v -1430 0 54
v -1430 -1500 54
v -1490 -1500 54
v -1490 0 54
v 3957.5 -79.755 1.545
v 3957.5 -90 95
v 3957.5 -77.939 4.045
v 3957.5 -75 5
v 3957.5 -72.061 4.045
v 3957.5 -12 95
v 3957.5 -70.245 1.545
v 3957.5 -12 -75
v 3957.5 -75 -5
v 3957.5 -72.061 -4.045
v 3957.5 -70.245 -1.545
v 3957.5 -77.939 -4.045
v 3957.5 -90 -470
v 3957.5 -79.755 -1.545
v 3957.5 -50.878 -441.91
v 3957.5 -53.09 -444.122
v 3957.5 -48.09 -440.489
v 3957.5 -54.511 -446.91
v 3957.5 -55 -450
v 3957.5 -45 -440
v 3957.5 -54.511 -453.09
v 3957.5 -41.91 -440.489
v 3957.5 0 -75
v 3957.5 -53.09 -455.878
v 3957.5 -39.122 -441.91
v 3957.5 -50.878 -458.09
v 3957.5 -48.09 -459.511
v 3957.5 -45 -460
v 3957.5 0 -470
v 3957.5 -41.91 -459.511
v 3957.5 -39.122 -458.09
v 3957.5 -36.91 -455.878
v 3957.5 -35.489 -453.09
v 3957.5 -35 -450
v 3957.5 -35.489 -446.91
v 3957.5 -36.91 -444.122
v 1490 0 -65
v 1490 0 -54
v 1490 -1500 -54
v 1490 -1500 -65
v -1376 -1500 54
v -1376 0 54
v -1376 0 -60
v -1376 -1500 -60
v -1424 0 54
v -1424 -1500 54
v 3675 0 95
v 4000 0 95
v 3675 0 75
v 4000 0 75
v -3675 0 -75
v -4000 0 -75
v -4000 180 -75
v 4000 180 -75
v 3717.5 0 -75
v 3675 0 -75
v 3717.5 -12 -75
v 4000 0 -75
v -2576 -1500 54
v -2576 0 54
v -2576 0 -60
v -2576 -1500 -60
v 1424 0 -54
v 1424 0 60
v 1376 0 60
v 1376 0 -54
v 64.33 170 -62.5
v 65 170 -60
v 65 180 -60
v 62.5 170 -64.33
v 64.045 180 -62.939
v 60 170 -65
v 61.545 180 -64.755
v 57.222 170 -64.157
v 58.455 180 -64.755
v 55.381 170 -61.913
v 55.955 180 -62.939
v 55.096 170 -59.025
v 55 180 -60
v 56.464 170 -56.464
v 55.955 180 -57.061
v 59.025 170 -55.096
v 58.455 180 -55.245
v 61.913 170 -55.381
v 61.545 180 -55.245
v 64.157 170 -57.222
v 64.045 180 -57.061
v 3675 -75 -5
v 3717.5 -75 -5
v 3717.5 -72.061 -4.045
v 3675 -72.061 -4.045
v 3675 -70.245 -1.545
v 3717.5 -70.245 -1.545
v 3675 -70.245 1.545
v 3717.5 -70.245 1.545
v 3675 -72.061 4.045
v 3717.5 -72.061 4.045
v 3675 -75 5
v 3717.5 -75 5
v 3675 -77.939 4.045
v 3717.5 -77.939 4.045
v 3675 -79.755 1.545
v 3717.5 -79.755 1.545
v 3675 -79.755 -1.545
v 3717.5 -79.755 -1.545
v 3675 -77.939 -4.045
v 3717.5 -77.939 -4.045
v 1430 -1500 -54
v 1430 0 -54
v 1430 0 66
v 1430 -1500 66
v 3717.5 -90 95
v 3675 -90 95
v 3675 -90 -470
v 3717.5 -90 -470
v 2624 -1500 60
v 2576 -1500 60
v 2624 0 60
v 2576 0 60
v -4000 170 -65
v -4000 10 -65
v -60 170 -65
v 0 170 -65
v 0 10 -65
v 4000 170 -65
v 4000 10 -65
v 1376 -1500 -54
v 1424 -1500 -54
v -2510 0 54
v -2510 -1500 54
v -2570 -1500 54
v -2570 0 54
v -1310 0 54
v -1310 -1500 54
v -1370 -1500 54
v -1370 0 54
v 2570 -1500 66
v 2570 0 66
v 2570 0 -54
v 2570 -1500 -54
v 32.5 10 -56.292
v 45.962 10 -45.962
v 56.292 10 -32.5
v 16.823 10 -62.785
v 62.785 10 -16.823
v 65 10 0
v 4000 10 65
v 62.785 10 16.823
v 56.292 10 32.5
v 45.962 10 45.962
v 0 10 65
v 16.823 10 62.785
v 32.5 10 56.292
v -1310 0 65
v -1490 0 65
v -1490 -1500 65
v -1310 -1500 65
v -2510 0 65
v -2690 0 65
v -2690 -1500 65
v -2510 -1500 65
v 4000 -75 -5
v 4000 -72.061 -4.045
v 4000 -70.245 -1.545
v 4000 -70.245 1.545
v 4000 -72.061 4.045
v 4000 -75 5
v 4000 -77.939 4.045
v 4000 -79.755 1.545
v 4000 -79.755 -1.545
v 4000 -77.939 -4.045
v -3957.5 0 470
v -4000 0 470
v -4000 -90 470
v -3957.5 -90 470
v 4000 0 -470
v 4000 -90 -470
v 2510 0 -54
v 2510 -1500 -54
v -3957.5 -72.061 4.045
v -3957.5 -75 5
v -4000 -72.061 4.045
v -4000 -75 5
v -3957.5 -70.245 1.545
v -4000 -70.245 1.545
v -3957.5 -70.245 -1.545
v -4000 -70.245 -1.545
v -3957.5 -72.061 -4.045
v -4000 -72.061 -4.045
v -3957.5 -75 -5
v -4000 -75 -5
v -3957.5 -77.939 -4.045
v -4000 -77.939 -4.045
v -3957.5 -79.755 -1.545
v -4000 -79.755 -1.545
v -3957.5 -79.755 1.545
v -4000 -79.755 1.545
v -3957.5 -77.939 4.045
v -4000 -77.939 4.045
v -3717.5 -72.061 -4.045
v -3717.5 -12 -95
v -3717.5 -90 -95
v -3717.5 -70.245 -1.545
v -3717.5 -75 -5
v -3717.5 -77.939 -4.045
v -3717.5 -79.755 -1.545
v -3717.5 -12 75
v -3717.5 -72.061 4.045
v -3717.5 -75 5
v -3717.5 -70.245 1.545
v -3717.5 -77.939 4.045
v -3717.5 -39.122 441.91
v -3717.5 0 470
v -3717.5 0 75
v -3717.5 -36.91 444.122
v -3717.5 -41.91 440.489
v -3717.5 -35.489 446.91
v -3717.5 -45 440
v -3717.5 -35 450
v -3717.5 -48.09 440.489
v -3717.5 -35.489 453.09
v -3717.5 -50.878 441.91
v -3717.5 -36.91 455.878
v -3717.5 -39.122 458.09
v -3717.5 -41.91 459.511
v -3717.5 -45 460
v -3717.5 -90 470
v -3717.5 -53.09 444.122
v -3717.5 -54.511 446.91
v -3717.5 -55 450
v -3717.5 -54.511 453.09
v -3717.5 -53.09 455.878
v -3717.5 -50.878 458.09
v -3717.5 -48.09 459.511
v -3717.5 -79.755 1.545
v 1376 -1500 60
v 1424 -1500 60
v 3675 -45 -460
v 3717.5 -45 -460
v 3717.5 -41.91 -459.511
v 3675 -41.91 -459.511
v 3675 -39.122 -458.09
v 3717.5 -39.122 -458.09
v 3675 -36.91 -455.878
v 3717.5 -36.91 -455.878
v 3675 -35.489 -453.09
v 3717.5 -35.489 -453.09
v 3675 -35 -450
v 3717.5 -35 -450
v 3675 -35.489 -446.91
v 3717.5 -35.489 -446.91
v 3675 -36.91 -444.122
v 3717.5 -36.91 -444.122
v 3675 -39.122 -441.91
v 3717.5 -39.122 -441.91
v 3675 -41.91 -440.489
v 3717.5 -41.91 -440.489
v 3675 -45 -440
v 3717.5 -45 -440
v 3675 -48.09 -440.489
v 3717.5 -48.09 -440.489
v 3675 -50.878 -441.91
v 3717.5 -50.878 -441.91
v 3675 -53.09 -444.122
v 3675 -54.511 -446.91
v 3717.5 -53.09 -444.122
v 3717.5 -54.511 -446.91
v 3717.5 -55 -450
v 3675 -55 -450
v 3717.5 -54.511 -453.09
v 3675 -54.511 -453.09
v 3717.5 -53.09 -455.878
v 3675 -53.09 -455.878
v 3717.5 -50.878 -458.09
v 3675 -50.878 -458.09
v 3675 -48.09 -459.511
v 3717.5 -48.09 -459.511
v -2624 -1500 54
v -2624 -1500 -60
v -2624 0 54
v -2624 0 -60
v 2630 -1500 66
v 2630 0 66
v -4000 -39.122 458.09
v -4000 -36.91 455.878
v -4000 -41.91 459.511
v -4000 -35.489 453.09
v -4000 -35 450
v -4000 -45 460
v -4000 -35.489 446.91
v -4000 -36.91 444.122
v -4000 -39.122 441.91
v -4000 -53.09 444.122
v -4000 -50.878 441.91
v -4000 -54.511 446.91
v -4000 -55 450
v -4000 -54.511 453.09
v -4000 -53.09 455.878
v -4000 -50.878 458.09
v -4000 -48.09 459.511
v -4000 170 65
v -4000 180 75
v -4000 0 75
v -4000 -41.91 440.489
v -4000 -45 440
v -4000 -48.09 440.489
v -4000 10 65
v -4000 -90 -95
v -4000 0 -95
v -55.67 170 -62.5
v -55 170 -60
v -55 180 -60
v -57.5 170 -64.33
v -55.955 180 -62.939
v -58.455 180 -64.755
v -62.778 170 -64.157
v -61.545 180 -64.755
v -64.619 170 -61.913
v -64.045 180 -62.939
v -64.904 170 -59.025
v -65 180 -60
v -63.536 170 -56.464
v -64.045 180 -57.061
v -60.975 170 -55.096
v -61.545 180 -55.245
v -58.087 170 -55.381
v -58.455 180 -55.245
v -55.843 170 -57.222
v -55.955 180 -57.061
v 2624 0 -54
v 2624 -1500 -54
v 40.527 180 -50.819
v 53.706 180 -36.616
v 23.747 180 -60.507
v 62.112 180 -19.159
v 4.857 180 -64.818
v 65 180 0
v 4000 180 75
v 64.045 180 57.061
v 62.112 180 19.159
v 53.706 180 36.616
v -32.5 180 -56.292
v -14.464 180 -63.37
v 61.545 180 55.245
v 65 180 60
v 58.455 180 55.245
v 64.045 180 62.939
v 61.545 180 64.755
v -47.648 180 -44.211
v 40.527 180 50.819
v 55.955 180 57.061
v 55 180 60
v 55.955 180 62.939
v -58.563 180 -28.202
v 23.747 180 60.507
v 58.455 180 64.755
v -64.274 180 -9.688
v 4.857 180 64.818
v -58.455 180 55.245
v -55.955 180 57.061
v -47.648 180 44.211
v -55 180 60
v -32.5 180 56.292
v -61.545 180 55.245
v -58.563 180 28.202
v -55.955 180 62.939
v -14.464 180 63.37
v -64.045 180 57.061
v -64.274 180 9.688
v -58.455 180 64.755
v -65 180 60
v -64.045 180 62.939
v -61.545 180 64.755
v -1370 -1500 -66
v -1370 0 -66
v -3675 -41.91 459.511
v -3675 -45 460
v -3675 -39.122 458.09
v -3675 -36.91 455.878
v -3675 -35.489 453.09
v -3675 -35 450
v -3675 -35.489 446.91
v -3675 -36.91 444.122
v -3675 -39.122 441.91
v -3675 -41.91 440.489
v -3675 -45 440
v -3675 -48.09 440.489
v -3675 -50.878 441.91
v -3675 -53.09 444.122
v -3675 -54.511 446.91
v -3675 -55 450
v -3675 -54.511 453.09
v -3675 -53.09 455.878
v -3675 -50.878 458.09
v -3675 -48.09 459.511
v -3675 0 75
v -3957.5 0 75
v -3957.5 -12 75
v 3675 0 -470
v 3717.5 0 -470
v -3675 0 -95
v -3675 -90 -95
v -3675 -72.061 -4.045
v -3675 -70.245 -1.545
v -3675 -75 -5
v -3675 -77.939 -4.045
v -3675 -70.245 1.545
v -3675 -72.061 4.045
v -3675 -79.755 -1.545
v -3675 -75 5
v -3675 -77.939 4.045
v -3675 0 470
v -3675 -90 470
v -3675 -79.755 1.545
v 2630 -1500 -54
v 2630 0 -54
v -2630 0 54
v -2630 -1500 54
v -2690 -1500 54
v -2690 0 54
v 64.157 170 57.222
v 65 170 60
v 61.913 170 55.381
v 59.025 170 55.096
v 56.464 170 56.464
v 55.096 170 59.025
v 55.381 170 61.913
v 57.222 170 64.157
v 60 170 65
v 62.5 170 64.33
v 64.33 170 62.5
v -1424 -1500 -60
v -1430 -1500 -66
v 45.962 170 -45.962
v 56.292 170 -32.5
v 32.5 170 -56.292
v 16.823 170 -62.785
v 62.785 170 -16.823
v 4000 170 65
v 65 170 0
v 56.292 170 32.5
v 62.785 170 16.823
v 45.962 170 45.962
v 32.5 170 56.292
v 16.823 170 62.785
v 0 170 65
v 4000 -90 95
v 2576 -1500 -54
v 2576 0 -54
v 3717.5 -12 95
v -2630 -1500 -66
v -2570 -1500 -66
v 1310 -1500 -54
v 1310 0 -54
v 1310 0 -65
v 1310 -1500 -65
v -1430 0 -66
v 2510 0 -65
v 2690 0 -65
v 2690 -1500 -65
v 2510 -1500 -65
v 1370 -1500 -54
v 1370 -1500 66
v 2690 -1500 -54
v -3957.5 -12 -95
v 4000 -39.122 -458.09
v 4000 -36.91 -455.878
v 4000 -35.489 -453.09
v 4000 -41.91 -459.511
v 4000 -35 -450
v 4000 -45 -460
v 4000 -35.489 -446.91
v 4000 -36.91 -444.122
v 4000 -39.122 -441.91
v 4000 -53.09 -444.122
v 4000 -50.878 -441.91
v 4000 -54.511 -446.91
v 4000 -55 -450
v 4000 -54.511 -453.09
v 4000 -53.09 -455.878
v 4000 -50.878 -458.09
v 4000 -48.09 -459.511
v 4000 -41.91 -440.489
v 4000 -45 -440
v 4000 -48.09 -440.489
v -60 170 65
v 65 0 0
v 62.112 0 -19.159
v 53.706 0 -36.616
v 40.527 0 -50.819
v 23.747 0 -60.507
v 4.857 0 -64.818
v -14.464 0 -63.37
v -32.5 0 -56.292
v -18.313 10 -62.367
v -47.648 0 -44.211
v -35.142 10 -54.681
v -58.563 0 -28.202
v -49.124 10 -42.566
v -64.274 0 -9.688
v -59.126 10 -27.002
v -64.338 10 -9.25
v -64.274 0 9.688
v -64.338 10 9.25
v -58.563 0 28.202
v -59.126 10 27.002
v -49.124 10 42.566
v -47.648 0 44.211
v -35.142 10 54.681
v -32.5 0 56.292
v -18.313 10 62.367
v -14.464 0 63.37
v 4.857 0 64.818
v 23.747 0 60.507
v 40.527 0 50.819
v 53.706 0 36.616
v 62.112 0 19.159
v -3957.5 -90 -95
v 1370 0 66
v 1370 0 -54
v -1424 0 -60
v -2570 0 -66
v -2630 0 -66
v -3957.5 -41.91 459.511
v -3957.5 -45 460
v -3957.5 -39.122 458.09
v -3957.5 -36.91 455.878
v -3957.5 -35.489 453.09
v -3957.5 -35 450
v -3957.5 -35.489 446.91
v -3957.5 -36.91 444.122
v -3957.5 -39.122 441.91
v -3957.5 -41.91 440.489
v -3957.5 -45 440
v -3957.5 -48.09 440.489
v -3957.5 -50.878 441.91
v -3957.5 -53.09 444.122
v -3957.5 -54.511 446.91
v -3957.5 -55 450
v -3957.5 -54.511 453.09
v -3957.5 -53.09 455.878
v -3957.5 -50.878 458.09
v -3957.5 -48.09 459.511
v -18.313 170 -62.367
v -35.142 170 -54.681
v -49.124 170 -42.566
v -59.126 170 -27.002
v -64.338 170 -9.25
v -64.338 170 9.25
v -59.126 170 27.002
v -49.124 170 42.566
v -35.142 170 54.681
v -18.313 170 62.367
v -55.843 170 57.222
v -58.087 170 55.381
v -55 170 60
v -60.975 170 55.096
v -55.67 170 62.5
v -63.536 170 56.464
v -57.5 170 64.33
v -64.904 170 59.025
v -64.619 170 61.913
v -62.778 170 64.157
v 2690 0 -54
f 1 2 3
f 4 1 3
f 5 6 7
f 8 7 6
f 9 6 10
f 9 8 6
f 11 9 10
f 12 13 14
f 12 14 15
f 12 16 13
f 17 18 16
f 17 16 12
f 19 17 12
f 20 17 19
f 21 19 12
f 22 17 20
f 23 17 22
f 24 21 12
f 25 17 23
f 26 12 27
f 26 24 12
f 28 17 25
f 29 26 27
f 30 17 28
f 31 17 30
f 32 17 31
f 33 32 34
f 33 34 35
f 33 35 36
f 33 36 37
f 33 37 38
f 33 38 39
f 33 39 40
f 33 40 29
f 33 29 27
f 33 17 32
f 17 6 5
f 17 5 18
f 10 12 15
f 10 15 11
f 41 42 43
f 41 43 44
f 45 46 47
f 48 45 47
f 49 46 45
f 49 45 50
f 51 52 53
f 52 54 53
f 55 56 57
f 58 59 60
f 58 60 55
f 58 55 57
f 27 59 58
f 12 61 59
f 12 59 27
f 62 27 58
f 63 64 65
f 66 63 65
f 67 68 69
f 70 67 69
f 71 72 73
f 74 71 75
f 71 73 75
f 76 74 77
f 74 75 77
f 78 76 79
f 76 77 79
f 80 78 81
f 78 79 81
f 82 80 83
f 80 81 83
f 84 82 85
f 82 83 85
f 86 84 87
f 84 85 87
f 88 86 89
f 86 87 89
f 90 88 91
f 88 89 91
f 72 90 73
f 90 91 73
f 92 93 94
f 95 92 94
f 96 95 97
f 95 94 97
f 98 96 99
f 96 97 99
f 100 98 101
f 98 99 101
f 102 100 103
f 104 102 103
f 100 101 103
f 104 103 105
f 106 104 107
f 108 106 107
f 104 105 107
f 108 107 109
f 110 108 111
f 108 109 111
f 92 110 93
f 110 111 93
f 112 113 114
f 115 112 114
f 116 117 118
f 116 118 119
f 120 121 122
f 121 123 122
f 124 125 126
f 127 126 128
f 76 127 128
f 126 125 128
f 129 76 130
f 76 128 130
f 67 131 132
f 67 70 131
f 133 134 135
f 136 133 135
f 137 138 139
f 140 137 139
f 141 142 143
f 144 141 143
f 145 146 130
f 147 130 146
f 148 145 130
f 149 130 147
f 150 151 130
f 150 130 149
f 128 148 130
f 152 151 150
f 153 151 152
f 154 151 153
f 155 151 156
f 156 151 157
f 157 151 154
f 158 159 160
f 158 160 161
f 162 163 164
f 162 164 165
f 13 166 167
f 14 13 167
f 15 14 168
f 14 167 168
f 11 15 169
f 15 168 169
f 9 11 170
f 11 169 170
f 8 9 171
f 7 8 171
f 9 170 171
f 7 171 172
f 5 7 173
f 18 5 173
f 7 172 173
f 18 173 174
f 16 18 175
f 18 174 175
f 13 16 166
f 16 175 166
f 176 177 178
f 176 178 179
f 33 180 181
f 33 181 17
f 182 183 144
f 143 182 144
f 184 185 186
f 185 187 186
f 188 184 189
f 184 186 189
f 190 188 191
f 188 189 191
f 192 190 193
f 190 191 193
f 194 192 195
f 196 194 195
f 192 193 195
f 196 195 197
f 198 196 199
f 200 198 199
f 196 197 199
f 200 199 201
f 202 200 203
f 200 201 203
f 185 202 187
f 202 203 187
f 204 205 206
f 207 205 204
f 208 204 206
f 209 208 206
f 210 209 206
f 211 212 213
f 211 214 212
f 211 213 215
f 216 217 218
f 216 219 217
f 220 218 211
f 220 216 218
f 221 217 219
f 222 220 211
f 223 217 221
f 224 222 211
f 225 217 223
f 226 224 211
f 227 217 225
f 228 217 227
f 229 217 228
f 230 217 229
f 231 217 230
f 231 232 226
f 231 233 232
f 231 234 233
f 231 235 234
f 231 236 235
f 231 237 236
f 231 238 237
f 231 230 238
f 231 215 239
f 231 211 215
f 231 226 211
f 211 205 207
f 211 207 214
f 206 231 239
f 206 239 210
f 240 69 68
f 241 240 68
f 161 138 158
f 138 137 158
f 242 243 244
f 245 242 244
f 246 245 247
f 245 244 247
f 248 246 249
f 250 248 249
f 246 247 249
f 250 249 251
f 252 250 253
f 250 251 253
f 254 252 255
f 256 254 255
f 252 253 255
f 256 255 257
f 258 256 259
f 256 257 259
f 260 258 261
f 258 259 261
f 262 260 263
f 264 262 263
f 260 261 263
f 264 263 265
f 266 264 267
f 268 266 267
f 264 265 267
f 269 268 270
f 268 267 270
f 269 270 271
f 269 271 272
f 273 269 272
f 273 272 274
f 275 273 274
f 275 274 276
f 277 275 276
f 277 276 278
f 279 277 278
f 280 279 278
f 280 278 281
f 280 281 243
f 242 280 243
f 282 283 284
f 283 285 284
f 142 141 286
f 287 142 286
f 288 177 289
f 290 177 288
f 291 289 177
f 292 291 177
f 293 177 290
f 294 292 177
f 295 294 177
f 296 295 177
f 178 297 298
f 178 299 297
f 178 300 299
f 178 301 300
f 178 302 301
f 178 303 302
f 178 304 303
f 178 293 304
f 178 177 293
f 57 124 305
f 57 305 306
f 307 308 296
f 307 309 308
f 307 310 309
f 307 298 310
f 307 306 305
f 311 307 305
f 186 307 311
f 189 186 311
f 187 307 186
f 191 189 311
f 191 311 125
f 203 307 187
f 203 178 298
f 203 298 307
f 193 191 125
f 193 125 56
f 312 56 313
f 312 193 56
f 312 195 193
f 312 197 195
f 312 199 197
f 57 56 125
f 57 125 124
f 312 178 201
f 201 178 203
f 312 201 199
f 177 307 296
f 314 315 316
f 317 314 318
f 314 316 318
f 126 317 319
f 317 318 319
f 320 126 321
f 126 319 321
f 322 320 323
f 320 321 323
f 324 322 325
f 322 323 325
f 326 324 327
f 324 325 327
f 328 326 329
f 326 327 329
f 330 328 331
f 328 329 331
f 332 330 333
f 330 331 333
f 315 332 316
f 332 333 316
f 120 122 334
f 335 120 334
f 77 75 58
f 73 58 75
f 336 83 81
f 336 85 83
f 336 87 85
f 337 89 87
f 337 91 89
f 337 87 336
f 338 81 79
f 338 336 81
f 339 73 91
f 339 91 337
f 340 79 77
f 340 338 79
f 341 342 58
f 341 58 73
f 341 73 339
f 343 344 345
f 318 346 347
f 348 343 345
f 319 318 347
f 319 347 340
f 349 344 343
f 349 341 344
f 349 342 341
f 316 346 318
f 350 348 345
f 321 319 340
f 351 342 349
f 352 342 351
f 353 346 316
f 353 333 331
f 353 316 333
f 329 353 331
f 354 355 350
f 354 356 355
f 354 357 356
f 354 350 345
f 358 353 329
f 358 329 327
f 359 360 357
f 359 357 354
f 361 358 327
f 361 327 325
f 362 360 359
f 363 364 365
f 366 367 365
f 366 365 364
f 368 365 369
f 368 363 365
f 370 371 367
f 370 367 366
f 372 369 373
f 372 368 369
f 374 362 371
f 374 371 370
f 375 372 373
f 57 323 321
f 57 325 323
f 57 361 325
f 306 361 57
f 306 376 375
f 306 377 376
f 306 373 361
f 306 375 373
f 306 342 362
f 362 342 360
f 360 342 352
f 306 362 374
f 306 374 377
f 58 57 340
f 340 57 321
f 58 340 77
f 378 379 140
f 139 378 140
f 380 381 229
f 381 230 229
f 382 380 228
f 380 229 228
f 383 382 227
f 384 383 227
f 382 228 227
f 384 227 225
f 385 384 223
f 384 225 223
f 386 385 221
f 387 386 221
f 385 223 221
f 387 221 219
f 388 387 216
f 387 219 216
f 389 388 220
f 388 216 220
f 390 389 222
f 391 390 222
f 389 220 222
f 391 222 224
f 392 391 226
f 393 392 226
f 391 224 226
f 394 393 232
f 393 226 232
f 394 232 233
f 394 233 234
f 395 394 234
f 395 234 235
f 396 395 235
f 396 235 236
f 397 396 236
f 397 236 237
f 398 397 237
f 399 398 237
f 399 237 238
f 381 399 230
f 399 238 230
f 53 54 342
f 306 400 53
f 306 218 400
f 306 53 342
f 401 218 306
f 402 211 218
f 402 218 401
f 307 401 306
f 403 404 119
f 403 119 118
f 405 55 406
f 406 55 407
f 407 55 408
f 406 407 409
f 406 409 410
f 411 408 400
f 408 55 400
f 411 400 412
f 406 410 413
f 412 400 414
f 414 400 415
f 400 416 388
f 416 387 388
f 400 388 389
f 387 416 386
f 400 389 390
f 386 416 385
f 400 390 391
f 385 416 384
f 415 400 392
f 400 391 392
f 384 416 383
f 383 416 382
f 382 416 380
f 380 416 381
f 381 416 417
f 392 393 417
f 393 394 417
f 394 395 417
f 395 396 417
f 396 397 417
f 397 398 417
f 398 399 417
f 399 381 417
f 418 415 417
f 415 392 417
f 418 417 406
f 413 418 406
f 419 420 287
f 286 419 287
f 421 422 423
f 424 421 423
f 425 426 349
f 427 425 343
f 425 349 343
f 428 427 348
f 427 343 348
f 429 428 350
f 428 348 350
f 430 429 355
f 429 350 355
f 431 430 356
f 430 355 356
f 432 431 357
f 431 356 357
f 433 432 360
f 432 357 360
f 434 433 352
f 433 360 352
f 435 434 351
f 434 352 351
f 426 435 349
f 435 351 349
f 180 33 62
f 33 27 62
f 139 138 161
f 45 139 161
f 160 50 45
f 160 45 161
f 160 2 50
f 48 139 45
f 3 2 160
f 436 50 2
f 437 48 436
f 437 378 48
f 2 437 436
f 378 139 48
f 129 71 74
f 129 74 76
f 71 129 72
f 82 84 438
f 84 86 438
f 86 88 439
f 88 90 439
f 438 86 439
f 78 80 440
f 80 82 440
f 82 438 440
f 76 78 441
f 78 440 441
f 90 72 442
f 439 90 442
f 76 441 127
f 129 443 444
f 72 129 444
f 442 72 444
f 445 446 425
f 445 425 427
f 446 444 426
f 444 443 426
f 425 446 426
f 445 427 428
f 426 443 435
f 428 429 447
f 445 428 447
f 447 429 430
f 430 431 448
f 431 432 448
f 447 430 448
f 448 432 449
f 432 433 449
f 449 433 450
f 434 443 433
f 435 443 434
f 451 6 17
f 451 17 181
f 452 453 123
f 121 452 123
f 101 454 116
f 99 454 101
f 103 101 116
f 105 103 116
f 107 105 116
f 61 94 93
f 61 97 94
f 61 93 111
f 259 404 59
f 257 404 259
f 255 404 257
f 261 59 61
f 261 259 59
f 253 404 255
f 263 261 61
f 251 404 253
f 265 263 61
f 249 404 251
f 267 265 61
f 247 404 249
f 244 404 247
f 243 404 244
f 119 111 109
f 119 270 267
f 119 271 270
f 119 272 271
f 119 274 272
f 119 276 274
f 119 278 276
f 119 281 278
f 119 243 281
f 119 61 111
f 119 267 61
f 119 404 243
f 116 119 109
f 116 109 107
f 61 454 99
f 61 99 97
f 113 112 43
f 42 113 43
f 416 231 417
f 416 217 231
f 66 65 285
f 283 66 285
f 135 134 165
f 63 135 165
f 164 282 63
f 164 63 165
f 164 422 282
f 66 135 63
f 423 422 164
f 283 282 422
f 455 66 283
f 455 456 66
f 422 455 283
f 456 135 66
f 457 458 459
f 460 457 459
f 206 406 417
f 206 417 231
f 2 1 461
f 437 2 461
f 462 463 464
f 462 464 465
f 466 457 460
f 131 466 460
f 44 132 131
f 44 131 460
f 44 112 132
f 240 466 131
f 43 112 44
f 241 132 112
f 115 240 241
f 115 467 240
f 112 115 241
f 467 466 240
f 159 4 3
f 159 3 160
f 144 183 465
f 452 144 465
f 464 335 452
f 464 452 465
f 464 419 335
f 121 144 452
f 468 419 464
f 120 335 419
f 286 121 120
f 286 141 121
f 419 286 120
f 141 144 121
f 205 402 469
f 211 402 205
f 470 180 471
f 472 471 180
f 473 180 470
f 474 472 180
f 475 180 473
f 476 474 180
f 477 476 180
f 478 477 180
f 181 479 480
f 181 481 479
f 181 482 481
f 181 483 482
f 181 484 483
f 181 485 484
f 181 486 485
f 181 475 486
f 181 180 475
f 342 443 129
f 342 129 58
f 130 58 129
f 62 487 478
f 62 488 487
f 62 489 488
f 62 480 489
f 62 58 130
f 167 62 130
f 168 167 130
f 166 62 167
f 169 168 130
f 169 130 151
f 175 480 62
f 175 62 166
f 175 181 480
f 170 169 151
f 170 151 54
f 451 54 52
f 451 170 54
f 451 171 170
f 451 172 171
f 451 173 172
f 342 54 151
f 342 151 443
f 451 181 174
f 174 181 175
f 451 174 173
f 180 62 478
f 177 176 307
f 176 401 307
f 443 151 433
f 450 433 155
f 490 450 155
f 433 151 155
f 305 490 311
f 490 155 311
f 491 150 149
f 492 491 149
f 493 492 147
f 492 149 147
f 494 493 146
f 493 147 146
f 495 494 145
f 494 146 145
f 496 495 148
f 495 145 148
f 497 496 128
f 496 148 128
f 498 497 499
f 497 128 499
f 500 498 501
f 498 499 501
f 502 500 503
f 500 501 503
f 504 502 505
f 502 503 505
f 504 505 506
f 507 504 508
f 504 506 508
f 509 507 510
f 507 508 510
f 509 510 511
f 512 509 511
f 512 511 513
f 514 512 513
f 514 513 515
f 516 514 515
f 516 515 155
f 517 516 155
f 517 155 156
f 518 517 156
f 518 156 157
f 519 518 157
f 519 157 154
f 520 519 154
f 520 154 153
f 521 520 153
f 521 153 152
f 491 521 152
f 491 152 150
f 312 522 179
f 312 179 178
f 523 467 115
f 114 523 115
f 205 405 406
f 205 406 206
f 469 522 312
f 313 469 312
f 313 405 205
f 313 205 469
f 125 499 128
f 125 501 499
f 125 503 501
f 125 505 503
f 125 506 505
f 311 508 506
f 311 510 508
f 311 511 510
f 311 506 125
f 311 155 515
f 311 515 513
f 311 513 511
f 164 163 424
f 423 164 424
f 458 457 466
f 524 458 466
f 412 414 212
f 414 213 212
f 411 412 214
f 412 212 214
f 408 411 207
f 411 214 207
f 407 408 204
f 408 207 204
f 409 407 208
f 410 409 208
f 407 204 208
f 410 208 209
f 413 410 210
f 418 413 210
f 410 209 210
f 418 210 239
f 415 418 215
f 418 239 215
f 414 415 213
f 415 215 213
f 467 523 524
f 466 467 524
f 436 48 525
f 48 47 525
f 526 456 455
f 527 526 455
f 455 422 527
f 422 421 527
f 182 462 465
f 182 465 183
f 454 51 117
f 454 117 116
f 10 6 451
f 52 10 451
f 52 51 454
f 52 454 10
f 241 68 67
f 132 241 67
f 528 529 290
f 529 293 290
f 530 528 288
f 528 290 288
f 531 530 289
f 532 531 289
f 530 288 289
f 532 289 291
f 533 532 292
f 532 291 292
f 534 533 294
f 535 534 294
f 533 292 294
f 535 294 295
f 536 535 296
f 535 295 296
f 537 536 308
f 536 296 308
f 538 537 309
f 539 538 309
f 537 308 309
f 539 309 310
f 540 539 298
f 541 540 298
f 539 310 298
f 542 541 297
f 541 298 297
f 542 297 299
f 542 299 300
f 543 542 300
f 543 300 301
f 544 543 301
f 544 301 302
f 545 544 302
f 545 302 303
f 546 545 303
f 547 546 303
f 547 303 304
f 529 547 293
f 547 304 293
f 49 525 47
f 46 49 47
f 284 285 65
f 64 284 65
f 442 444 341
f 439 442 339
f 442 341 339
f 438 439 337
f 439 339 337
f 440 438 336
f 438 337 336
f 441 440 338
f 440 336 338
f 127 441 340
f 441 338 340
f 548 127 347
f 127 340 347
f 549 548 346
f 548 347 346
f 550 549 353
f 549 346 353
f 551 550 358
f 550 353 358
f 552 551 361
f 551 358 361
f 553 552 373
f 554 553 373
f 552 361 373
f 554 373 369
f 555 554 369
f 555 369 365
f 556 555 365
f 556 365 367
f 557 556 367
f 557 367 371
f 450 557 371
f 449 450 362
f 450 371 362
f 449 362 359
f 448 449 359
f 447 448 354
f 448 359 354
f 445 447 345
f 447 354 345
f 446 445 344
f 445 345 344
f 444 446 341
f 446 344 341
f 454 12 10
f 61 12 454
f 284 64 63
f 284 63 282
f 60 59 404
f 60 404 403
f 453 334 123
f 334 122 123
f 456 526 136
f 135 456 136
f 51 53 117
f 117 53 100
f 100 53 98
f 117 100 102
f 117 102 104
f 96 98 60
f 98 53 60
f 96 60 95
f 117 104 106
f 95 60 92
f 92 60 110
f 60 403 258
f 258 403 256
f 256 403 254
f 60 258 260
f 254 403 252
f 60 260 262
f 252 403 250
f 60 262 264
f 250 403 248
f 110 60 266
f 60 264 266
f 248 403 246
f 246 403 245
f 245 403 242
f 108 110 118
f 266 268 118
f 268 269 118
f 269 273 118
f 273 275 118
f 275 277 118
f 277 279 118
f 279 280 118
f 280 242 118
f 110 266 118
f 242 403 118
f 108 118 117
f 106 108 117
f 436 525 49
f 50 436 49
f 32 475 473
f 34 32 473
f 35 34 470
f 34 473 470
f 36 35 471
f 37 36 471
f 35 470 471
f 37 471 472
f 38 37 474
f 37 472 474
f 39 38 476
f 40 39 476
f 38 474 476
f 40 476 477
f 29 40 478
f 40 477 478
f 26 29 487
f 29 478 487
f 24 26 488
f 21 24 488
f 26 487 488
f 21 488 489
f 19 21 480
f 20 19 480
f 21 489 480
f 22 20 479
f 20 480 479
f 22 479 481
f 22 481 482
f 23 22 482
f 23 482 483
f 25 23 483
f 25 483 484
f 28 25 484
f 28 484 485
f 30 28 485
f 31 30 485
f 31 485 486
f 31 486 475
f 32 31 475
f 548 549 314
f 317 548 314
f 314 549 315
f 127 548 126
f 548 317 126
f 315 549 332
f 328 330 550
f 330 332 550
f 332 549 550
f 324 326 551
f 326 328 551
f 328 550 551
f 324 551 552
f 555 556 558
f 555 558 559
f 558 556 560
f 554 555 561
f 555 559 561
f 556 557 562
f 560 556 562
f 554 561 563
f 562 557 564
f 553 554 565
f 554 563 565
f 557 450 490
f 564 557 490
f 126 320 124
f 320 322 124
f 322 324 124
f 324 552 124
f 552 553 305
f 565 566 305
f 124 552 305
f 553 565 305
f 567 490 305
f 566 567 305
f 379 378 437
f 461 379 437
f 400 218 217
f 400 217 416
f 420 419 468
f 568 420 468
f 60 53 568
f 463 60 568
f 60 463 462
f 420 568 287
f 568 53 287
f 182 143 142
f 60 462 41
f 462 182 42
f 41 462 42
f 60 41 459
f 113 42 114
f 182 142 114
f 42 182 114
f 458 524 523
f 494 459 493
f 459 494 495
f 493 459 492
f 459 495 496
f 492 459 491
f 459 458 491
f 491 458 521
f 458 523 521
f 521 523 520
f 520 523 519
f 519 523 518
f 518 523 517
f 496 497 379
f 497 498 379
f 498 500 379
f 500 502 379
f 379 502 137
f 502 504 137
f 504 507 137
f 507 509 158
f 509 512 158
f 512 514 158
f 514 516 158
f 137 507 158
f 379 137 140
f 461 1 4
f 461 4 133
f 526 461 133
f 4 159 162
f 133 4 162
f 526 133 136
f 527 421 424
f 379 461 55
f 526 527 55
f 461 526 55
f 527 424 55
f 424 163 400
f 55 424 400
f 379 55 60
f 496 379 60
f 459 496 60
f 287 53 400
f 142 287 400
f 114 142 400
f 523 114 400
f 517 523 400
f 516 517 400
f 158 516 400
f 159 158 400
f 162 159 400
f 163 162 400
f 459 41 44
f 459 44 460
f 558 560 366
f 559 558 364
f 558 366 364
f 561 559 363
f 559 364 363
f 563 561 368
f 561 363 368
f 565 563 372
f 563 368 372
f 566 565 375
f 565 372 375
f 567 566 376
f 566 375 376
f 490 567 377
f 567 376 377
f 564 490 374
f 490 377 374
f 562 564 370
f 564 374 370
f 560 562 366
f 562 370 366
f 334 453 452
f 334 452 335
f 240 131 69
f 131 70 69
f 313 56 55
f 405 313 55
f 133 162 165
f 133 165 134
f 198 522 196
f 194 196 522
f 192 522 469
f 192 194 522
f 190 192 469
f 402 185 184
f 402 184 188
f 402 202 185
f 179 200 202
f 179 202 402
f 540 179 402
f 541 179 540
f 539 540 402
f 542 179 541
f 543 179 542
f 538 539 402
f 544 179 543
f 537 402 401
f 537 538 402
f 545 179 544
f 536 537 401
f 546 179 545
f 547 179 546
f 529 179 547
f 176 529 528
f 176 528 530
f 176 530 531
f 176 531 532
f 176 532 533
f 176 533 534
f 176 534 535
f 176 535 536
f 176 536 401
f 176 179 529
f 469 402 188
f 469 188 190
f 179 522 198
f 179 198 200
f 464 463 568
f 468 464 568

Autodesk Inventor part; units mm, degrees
ref_plane "YZ Plane" through (0, 0, 0) normal (1, 0, 0) x (0, 1, 0)
ref_plane "XZ Plane" through (0, 0, 0) normal (0, 1, 0) x (-1, 0, 0)
sketch "Sketch1" plane through (0, 0, 0) normal (0, 1, 0) x (-1, 0, 0)
  line L0 (0, 0) -> (-1400, 0) construction
  line L1 (-1400, 0) -> (-2600, 0) construction
  line L2 (-2600, 0) -> (-4000, 0) construction
  line L3 (-4000, 75) -> (0, 75)
  line L4 (0, 75) -> (0, -75)
  line L5 (0, -75) -> (-4000, -75)
  line L6 (-4000, -75) -> (-4000, 75)
  line L7 (-4000, 75) -> (0, -75) construction
  line L8 (0, 75) -> (-4000, -75) construction
  point P0 (-2000, 0)
  dimension "d0" = 1400
  dimension "d1" = 1200
  dimension "d2" = 1400
  dimension "d3" = 150
  dimension "d4" = 4000
extrude "Extrusion1" add sketch "Sketch1" along normal blind 180
shell "Shell1" thickness 10 removed faces 2 at (4000, 60, 25) at (0, 60, -25)
sketch "Sketch2" plane through (0, 0, 0) normal (0, -1, 0) x (1, 0, 0)
  line L0 (0, 0) -> (1400, 0) construction
  line L1 (1400, 0) -> (2600, 0) construction
  line L2 (2600, 0) -> (4000, 0) construction
  line L3 (0, -75) -> (0, 75) construction
  line L4 (4000, 75) -> (4000, -75) construction
  line L5 (0, 75) -> (4000, 75) construction
  line L6 (4000, 75) -> (4000, -75) construction
  line L7 (4000, -75) -> (0, -75) construction
  line L8 (0, -75) -> (0, 75) construction
  line L9 (3991, 66) -> (9, 66) construction
  line L10 (9, 66) -> (9, -66) construction
  line L11 (9, -66) -> (3991, -66) construction
  line L12 (3991, -66) -> (3991, 66) construction
  line L13 (1370, -66) -> (1370, 66) construction
  line L14 (1370, 66) -> (1430, 66) construction
  line L15 (1430, 66) -> (1430, -66) construction
  line L16 (1430, -66) -> (1370, -66) construction
  line L17 (1370, -66) -> (1430, 66) construction
  line L18 (1370, 66) -> (1430, -66) construction
  line L19 (1310, -66) -> (1310, 66) construction
  line L20 (1310, 66) -> (1490, 66) construction
  line L21 (1490, 66) -> (1490, -66) construction
  line L22 (1490, -66) -> (1310, -66) construction
  line L23 (1310, -66) -> (1490, 66) construction
  line L24 (1310, 66) -> (1490, -66) construction
  line L25 (1310, -66) -> (1490, -66) construction
  line L26 (1490, -66) -> (1490, -54) construction
  line L27 (1490, -54) -> (1310, -54) construction
  line L28 (1310, -54) -> (1310, -66) construction
  line L29 (1370, -54) -> (1430, -54) construction
  line L30 (1430, -54) -> (1430, 66) construction
  line L31 (1430, 66) -> (1370, 66) construction
  line L32 (1370, 66) -> (1370, -54) construction
  line L33 (1310, -54) -> (1370, -54)
  line L34 (1370, 66) -> (1370, -54)
  line L35 (1430, -54) -> (1430, 66)
  line L36 (1370, 66) -> (1430, 66)
  line L37 (1430, -54) -> (1490, -54)
  line L38 (1310, -54) -> (1310, -66)
  line L39 (1310, -66) -> (1490, -66)
  line L40 (1490, -54) -> (1490, -66)
  line L41 (4000, -65) -> (0, -65) projected
  line L42 (1376, -54) -> (1376, 60)
  line L43 (1376, 60) -> (1424, 60)
  line L44 (1424, 60) -> (1424, -54)
  line L45 (1376, -54) -> (1424, -54)
  point P0 (1310, -65)
  point P1 (1490, -65)
  dimension "d8" = 1400
  dimension "d9" = 1200
  dimension "d10" = 1400
  dimension "d11" = 9
  dimension "d12" = 60
  dimension "d13" = 180
  dimension "d14" = 12
  dimension "d15" = 6
  dimension "d16" = 114
extrude "Extrusion2" add sketch "Sketch2" along normal blind 1500 contours L33 L34 L36 L35 L37 L40 L41 L38
ref_plane "Work Plane1" through (1400, -1500, -54) normal (1, 0, 0) x (0, 0, -1)
ref_plane "Work Plane3" through (2000, -1500, -54) normal (1, 0, 0) x (0, 0, -1)
ref_plane "Work Plane2" through (2600, -1500, -54) normal (1, 0, 0) x (0, 0, -1)
mirror "Mirror1" about plane through (2000, -1500, -54) normal (1, 0, 0) of "Extrusion2"
sketch "Sketch3" plane through (0, 0, 75) normal (0, 0, 1) x (1, 0, 0)
  line L0 (4000, 0) -> (0, 0) projected
  line L1 (4000, 0) -> (3675, 0)
  line L2 (3675, 0) -> (3675, -90)
  line L3 (3675, -90) -> (4000, -90)
  line L4 (4000, -90) -> (4000, 0)
  line L5 (3675, 0) -> (3717.5, 0)
  line L6 (3717.5, 0) -> (3717.5, -90)
  line L7 (3717.5, -90) -> (3675, -90)
  line L8 (3675, -90) -> (3675, 0)
  line L9 (4000, -90) -> (3957.5, -90)
  line L10 (3957.5, -90) -> (3957.5, 0)
  line L11 (3957.5, 0) -> (4000, 0)
  line L12 (4000, 0) -> (4000, -90)
  line L13 (3717.5, 0) -> (3957.5, 0)
  line L14 (3957.5, 0) -> (3957.5, -12)
  line L15 (3957.5, -12) -> (3717.5, -12)
  line L16 (3717.5, -12) -> (3717.5, 0)
  dimension "d20" = 325
  dimension "d21" = 90
  dimension "d22" = 42.5
  dimension "d23" = 42.5
  dimension "d24" = 90
  dimension "d25" = 12
extrude "Extrusion3" add sketch "Sketch3" along normal blind 20 and the other way blind 150 contours L4 L3 L10 L0 | L10 L15 L6 L0 | L6 L3 L2 L0
sketch "Sketch5" plane through (4000, 180, -75) normal (0, 0, -1) x (-1, 0, 0)
  line L0 (0, 0) -> (0, -270) projected
  line L1 (0, -270) -> (42.5, -270)
  line L2 (42.5, -270) -> (42.5, -180)
  line L3 (42.5, -180) -> (0, -180)
  line L4 (0, -180) -> (0, -270)
  line L5 (282.5, -270) -> (325, -270) projected
  line L6 (325, -270) -> (282.5, -270)
  line L7 (282.5, -270) -> (282.5, -180)
  line L8 (282.5, -180) -> (325, -180)
  line L9 (325, -180) -> (325, -270)
  point P0 (4000, -180)
  dimension "d36" = 90
  dimension "d37" = 42.5
  dimension "d38" = 90
extrude "Extrusion4" add sketch "Sketch5" along normal blind 395
sketch "Sketch6" plane through (4000, 180, 75) normal (1, 0, 0) x (0, 0, -1)
  line L0 (-20, -192) -> (-20, -270) projected
  line L1 (-20, -270) -> (75, -270) construction
  line L2 (75, -270) -> (75, -255) construction
  line L3 (75, -255) -> (-20, -255) construction
  line L4 (-20, -255) -> (-20, -270) construction
  circle A0 centre (75, -255) radius 5
  line L5 (150, -180) -> (545, -180) projected
  line L6 (545, -180) -> (525, -180) construction
  line L7 (525, -180) -> (525, -225) construction
  line L8 (525, -225) -> (545, -225) construction
  line L9 (545, -225) -> (545, -180) construction
  circle A1 centre (525, -225) radius 10
  point P0 (75, -180)
  dimension "d41" = 95
  dimension "d42" = 15
  dimension "d43" = 10
  dimension "d44" = 20
  dimension "d45" = 20
extrude "Extrusion5" cut sketch "Sketch6" against normal up to surface (325 mm away)
ref_plane "Work Plane4" through (0, 180, 0) normal (0, 0, 1) x (1, 0, 0)
pattern_circular "Circular Pattern1" count 2 over 360 about axis through (0, -10, 0) along (0, 1, 0)
sketch "Sketch7" plane through (0, 180, 0) normal (0, 1, 0) x (1, 0, 0)
  circle A0 centre (0, 0) radius 65
  dimension "d51" = 130
extrude "Extrusion6" cut sketch "Sketch7" against normal up to surface (180 mm away)
sketch "Sketch8" plane through (0, 180, 0) normal (0, 1, 0) x (1, 0, 0)
  line L0 (-3675, -75) -> (3675, -75) projected
  line L1 (-75, 75) -> (75, 75)
  line L2 (75, 75) -> (75, -75)
  line L3 (75, -75) -> (-75, -75)
  line L4 (-75, -75) -> (-75, 75)
  arc A0 (0, -65) -> (0, 65) centre (0, 0) ccw projected
  line L5 (-75, 75) -> (75, -75) construction
  line L6 (75, 75) -> (-75, -75) construction
  circle A1 centre (60, -60) radius 5
  line L7 (0, 75) -> (0, -75) construction
  line L8 (-75, 0) -> (75, 0) construction
  circle A2 centre (-60, -60) radius 5
  circle A3 centre (60, 60) radius 5
  circle A4 centre (-60, 60) radius 5
  dimension "d54" = 150
  dimension "d55" = 10
  dimension "d56" = 15
  dimension "d57" = 15
extrude "Extrusion7" cut sketch "Sketch8" against normal blind 20 contours A1 | A2 | A3 | A4
properties part number "Trave_e_Pale_inventor_coppia" material "Stainless Steel"
